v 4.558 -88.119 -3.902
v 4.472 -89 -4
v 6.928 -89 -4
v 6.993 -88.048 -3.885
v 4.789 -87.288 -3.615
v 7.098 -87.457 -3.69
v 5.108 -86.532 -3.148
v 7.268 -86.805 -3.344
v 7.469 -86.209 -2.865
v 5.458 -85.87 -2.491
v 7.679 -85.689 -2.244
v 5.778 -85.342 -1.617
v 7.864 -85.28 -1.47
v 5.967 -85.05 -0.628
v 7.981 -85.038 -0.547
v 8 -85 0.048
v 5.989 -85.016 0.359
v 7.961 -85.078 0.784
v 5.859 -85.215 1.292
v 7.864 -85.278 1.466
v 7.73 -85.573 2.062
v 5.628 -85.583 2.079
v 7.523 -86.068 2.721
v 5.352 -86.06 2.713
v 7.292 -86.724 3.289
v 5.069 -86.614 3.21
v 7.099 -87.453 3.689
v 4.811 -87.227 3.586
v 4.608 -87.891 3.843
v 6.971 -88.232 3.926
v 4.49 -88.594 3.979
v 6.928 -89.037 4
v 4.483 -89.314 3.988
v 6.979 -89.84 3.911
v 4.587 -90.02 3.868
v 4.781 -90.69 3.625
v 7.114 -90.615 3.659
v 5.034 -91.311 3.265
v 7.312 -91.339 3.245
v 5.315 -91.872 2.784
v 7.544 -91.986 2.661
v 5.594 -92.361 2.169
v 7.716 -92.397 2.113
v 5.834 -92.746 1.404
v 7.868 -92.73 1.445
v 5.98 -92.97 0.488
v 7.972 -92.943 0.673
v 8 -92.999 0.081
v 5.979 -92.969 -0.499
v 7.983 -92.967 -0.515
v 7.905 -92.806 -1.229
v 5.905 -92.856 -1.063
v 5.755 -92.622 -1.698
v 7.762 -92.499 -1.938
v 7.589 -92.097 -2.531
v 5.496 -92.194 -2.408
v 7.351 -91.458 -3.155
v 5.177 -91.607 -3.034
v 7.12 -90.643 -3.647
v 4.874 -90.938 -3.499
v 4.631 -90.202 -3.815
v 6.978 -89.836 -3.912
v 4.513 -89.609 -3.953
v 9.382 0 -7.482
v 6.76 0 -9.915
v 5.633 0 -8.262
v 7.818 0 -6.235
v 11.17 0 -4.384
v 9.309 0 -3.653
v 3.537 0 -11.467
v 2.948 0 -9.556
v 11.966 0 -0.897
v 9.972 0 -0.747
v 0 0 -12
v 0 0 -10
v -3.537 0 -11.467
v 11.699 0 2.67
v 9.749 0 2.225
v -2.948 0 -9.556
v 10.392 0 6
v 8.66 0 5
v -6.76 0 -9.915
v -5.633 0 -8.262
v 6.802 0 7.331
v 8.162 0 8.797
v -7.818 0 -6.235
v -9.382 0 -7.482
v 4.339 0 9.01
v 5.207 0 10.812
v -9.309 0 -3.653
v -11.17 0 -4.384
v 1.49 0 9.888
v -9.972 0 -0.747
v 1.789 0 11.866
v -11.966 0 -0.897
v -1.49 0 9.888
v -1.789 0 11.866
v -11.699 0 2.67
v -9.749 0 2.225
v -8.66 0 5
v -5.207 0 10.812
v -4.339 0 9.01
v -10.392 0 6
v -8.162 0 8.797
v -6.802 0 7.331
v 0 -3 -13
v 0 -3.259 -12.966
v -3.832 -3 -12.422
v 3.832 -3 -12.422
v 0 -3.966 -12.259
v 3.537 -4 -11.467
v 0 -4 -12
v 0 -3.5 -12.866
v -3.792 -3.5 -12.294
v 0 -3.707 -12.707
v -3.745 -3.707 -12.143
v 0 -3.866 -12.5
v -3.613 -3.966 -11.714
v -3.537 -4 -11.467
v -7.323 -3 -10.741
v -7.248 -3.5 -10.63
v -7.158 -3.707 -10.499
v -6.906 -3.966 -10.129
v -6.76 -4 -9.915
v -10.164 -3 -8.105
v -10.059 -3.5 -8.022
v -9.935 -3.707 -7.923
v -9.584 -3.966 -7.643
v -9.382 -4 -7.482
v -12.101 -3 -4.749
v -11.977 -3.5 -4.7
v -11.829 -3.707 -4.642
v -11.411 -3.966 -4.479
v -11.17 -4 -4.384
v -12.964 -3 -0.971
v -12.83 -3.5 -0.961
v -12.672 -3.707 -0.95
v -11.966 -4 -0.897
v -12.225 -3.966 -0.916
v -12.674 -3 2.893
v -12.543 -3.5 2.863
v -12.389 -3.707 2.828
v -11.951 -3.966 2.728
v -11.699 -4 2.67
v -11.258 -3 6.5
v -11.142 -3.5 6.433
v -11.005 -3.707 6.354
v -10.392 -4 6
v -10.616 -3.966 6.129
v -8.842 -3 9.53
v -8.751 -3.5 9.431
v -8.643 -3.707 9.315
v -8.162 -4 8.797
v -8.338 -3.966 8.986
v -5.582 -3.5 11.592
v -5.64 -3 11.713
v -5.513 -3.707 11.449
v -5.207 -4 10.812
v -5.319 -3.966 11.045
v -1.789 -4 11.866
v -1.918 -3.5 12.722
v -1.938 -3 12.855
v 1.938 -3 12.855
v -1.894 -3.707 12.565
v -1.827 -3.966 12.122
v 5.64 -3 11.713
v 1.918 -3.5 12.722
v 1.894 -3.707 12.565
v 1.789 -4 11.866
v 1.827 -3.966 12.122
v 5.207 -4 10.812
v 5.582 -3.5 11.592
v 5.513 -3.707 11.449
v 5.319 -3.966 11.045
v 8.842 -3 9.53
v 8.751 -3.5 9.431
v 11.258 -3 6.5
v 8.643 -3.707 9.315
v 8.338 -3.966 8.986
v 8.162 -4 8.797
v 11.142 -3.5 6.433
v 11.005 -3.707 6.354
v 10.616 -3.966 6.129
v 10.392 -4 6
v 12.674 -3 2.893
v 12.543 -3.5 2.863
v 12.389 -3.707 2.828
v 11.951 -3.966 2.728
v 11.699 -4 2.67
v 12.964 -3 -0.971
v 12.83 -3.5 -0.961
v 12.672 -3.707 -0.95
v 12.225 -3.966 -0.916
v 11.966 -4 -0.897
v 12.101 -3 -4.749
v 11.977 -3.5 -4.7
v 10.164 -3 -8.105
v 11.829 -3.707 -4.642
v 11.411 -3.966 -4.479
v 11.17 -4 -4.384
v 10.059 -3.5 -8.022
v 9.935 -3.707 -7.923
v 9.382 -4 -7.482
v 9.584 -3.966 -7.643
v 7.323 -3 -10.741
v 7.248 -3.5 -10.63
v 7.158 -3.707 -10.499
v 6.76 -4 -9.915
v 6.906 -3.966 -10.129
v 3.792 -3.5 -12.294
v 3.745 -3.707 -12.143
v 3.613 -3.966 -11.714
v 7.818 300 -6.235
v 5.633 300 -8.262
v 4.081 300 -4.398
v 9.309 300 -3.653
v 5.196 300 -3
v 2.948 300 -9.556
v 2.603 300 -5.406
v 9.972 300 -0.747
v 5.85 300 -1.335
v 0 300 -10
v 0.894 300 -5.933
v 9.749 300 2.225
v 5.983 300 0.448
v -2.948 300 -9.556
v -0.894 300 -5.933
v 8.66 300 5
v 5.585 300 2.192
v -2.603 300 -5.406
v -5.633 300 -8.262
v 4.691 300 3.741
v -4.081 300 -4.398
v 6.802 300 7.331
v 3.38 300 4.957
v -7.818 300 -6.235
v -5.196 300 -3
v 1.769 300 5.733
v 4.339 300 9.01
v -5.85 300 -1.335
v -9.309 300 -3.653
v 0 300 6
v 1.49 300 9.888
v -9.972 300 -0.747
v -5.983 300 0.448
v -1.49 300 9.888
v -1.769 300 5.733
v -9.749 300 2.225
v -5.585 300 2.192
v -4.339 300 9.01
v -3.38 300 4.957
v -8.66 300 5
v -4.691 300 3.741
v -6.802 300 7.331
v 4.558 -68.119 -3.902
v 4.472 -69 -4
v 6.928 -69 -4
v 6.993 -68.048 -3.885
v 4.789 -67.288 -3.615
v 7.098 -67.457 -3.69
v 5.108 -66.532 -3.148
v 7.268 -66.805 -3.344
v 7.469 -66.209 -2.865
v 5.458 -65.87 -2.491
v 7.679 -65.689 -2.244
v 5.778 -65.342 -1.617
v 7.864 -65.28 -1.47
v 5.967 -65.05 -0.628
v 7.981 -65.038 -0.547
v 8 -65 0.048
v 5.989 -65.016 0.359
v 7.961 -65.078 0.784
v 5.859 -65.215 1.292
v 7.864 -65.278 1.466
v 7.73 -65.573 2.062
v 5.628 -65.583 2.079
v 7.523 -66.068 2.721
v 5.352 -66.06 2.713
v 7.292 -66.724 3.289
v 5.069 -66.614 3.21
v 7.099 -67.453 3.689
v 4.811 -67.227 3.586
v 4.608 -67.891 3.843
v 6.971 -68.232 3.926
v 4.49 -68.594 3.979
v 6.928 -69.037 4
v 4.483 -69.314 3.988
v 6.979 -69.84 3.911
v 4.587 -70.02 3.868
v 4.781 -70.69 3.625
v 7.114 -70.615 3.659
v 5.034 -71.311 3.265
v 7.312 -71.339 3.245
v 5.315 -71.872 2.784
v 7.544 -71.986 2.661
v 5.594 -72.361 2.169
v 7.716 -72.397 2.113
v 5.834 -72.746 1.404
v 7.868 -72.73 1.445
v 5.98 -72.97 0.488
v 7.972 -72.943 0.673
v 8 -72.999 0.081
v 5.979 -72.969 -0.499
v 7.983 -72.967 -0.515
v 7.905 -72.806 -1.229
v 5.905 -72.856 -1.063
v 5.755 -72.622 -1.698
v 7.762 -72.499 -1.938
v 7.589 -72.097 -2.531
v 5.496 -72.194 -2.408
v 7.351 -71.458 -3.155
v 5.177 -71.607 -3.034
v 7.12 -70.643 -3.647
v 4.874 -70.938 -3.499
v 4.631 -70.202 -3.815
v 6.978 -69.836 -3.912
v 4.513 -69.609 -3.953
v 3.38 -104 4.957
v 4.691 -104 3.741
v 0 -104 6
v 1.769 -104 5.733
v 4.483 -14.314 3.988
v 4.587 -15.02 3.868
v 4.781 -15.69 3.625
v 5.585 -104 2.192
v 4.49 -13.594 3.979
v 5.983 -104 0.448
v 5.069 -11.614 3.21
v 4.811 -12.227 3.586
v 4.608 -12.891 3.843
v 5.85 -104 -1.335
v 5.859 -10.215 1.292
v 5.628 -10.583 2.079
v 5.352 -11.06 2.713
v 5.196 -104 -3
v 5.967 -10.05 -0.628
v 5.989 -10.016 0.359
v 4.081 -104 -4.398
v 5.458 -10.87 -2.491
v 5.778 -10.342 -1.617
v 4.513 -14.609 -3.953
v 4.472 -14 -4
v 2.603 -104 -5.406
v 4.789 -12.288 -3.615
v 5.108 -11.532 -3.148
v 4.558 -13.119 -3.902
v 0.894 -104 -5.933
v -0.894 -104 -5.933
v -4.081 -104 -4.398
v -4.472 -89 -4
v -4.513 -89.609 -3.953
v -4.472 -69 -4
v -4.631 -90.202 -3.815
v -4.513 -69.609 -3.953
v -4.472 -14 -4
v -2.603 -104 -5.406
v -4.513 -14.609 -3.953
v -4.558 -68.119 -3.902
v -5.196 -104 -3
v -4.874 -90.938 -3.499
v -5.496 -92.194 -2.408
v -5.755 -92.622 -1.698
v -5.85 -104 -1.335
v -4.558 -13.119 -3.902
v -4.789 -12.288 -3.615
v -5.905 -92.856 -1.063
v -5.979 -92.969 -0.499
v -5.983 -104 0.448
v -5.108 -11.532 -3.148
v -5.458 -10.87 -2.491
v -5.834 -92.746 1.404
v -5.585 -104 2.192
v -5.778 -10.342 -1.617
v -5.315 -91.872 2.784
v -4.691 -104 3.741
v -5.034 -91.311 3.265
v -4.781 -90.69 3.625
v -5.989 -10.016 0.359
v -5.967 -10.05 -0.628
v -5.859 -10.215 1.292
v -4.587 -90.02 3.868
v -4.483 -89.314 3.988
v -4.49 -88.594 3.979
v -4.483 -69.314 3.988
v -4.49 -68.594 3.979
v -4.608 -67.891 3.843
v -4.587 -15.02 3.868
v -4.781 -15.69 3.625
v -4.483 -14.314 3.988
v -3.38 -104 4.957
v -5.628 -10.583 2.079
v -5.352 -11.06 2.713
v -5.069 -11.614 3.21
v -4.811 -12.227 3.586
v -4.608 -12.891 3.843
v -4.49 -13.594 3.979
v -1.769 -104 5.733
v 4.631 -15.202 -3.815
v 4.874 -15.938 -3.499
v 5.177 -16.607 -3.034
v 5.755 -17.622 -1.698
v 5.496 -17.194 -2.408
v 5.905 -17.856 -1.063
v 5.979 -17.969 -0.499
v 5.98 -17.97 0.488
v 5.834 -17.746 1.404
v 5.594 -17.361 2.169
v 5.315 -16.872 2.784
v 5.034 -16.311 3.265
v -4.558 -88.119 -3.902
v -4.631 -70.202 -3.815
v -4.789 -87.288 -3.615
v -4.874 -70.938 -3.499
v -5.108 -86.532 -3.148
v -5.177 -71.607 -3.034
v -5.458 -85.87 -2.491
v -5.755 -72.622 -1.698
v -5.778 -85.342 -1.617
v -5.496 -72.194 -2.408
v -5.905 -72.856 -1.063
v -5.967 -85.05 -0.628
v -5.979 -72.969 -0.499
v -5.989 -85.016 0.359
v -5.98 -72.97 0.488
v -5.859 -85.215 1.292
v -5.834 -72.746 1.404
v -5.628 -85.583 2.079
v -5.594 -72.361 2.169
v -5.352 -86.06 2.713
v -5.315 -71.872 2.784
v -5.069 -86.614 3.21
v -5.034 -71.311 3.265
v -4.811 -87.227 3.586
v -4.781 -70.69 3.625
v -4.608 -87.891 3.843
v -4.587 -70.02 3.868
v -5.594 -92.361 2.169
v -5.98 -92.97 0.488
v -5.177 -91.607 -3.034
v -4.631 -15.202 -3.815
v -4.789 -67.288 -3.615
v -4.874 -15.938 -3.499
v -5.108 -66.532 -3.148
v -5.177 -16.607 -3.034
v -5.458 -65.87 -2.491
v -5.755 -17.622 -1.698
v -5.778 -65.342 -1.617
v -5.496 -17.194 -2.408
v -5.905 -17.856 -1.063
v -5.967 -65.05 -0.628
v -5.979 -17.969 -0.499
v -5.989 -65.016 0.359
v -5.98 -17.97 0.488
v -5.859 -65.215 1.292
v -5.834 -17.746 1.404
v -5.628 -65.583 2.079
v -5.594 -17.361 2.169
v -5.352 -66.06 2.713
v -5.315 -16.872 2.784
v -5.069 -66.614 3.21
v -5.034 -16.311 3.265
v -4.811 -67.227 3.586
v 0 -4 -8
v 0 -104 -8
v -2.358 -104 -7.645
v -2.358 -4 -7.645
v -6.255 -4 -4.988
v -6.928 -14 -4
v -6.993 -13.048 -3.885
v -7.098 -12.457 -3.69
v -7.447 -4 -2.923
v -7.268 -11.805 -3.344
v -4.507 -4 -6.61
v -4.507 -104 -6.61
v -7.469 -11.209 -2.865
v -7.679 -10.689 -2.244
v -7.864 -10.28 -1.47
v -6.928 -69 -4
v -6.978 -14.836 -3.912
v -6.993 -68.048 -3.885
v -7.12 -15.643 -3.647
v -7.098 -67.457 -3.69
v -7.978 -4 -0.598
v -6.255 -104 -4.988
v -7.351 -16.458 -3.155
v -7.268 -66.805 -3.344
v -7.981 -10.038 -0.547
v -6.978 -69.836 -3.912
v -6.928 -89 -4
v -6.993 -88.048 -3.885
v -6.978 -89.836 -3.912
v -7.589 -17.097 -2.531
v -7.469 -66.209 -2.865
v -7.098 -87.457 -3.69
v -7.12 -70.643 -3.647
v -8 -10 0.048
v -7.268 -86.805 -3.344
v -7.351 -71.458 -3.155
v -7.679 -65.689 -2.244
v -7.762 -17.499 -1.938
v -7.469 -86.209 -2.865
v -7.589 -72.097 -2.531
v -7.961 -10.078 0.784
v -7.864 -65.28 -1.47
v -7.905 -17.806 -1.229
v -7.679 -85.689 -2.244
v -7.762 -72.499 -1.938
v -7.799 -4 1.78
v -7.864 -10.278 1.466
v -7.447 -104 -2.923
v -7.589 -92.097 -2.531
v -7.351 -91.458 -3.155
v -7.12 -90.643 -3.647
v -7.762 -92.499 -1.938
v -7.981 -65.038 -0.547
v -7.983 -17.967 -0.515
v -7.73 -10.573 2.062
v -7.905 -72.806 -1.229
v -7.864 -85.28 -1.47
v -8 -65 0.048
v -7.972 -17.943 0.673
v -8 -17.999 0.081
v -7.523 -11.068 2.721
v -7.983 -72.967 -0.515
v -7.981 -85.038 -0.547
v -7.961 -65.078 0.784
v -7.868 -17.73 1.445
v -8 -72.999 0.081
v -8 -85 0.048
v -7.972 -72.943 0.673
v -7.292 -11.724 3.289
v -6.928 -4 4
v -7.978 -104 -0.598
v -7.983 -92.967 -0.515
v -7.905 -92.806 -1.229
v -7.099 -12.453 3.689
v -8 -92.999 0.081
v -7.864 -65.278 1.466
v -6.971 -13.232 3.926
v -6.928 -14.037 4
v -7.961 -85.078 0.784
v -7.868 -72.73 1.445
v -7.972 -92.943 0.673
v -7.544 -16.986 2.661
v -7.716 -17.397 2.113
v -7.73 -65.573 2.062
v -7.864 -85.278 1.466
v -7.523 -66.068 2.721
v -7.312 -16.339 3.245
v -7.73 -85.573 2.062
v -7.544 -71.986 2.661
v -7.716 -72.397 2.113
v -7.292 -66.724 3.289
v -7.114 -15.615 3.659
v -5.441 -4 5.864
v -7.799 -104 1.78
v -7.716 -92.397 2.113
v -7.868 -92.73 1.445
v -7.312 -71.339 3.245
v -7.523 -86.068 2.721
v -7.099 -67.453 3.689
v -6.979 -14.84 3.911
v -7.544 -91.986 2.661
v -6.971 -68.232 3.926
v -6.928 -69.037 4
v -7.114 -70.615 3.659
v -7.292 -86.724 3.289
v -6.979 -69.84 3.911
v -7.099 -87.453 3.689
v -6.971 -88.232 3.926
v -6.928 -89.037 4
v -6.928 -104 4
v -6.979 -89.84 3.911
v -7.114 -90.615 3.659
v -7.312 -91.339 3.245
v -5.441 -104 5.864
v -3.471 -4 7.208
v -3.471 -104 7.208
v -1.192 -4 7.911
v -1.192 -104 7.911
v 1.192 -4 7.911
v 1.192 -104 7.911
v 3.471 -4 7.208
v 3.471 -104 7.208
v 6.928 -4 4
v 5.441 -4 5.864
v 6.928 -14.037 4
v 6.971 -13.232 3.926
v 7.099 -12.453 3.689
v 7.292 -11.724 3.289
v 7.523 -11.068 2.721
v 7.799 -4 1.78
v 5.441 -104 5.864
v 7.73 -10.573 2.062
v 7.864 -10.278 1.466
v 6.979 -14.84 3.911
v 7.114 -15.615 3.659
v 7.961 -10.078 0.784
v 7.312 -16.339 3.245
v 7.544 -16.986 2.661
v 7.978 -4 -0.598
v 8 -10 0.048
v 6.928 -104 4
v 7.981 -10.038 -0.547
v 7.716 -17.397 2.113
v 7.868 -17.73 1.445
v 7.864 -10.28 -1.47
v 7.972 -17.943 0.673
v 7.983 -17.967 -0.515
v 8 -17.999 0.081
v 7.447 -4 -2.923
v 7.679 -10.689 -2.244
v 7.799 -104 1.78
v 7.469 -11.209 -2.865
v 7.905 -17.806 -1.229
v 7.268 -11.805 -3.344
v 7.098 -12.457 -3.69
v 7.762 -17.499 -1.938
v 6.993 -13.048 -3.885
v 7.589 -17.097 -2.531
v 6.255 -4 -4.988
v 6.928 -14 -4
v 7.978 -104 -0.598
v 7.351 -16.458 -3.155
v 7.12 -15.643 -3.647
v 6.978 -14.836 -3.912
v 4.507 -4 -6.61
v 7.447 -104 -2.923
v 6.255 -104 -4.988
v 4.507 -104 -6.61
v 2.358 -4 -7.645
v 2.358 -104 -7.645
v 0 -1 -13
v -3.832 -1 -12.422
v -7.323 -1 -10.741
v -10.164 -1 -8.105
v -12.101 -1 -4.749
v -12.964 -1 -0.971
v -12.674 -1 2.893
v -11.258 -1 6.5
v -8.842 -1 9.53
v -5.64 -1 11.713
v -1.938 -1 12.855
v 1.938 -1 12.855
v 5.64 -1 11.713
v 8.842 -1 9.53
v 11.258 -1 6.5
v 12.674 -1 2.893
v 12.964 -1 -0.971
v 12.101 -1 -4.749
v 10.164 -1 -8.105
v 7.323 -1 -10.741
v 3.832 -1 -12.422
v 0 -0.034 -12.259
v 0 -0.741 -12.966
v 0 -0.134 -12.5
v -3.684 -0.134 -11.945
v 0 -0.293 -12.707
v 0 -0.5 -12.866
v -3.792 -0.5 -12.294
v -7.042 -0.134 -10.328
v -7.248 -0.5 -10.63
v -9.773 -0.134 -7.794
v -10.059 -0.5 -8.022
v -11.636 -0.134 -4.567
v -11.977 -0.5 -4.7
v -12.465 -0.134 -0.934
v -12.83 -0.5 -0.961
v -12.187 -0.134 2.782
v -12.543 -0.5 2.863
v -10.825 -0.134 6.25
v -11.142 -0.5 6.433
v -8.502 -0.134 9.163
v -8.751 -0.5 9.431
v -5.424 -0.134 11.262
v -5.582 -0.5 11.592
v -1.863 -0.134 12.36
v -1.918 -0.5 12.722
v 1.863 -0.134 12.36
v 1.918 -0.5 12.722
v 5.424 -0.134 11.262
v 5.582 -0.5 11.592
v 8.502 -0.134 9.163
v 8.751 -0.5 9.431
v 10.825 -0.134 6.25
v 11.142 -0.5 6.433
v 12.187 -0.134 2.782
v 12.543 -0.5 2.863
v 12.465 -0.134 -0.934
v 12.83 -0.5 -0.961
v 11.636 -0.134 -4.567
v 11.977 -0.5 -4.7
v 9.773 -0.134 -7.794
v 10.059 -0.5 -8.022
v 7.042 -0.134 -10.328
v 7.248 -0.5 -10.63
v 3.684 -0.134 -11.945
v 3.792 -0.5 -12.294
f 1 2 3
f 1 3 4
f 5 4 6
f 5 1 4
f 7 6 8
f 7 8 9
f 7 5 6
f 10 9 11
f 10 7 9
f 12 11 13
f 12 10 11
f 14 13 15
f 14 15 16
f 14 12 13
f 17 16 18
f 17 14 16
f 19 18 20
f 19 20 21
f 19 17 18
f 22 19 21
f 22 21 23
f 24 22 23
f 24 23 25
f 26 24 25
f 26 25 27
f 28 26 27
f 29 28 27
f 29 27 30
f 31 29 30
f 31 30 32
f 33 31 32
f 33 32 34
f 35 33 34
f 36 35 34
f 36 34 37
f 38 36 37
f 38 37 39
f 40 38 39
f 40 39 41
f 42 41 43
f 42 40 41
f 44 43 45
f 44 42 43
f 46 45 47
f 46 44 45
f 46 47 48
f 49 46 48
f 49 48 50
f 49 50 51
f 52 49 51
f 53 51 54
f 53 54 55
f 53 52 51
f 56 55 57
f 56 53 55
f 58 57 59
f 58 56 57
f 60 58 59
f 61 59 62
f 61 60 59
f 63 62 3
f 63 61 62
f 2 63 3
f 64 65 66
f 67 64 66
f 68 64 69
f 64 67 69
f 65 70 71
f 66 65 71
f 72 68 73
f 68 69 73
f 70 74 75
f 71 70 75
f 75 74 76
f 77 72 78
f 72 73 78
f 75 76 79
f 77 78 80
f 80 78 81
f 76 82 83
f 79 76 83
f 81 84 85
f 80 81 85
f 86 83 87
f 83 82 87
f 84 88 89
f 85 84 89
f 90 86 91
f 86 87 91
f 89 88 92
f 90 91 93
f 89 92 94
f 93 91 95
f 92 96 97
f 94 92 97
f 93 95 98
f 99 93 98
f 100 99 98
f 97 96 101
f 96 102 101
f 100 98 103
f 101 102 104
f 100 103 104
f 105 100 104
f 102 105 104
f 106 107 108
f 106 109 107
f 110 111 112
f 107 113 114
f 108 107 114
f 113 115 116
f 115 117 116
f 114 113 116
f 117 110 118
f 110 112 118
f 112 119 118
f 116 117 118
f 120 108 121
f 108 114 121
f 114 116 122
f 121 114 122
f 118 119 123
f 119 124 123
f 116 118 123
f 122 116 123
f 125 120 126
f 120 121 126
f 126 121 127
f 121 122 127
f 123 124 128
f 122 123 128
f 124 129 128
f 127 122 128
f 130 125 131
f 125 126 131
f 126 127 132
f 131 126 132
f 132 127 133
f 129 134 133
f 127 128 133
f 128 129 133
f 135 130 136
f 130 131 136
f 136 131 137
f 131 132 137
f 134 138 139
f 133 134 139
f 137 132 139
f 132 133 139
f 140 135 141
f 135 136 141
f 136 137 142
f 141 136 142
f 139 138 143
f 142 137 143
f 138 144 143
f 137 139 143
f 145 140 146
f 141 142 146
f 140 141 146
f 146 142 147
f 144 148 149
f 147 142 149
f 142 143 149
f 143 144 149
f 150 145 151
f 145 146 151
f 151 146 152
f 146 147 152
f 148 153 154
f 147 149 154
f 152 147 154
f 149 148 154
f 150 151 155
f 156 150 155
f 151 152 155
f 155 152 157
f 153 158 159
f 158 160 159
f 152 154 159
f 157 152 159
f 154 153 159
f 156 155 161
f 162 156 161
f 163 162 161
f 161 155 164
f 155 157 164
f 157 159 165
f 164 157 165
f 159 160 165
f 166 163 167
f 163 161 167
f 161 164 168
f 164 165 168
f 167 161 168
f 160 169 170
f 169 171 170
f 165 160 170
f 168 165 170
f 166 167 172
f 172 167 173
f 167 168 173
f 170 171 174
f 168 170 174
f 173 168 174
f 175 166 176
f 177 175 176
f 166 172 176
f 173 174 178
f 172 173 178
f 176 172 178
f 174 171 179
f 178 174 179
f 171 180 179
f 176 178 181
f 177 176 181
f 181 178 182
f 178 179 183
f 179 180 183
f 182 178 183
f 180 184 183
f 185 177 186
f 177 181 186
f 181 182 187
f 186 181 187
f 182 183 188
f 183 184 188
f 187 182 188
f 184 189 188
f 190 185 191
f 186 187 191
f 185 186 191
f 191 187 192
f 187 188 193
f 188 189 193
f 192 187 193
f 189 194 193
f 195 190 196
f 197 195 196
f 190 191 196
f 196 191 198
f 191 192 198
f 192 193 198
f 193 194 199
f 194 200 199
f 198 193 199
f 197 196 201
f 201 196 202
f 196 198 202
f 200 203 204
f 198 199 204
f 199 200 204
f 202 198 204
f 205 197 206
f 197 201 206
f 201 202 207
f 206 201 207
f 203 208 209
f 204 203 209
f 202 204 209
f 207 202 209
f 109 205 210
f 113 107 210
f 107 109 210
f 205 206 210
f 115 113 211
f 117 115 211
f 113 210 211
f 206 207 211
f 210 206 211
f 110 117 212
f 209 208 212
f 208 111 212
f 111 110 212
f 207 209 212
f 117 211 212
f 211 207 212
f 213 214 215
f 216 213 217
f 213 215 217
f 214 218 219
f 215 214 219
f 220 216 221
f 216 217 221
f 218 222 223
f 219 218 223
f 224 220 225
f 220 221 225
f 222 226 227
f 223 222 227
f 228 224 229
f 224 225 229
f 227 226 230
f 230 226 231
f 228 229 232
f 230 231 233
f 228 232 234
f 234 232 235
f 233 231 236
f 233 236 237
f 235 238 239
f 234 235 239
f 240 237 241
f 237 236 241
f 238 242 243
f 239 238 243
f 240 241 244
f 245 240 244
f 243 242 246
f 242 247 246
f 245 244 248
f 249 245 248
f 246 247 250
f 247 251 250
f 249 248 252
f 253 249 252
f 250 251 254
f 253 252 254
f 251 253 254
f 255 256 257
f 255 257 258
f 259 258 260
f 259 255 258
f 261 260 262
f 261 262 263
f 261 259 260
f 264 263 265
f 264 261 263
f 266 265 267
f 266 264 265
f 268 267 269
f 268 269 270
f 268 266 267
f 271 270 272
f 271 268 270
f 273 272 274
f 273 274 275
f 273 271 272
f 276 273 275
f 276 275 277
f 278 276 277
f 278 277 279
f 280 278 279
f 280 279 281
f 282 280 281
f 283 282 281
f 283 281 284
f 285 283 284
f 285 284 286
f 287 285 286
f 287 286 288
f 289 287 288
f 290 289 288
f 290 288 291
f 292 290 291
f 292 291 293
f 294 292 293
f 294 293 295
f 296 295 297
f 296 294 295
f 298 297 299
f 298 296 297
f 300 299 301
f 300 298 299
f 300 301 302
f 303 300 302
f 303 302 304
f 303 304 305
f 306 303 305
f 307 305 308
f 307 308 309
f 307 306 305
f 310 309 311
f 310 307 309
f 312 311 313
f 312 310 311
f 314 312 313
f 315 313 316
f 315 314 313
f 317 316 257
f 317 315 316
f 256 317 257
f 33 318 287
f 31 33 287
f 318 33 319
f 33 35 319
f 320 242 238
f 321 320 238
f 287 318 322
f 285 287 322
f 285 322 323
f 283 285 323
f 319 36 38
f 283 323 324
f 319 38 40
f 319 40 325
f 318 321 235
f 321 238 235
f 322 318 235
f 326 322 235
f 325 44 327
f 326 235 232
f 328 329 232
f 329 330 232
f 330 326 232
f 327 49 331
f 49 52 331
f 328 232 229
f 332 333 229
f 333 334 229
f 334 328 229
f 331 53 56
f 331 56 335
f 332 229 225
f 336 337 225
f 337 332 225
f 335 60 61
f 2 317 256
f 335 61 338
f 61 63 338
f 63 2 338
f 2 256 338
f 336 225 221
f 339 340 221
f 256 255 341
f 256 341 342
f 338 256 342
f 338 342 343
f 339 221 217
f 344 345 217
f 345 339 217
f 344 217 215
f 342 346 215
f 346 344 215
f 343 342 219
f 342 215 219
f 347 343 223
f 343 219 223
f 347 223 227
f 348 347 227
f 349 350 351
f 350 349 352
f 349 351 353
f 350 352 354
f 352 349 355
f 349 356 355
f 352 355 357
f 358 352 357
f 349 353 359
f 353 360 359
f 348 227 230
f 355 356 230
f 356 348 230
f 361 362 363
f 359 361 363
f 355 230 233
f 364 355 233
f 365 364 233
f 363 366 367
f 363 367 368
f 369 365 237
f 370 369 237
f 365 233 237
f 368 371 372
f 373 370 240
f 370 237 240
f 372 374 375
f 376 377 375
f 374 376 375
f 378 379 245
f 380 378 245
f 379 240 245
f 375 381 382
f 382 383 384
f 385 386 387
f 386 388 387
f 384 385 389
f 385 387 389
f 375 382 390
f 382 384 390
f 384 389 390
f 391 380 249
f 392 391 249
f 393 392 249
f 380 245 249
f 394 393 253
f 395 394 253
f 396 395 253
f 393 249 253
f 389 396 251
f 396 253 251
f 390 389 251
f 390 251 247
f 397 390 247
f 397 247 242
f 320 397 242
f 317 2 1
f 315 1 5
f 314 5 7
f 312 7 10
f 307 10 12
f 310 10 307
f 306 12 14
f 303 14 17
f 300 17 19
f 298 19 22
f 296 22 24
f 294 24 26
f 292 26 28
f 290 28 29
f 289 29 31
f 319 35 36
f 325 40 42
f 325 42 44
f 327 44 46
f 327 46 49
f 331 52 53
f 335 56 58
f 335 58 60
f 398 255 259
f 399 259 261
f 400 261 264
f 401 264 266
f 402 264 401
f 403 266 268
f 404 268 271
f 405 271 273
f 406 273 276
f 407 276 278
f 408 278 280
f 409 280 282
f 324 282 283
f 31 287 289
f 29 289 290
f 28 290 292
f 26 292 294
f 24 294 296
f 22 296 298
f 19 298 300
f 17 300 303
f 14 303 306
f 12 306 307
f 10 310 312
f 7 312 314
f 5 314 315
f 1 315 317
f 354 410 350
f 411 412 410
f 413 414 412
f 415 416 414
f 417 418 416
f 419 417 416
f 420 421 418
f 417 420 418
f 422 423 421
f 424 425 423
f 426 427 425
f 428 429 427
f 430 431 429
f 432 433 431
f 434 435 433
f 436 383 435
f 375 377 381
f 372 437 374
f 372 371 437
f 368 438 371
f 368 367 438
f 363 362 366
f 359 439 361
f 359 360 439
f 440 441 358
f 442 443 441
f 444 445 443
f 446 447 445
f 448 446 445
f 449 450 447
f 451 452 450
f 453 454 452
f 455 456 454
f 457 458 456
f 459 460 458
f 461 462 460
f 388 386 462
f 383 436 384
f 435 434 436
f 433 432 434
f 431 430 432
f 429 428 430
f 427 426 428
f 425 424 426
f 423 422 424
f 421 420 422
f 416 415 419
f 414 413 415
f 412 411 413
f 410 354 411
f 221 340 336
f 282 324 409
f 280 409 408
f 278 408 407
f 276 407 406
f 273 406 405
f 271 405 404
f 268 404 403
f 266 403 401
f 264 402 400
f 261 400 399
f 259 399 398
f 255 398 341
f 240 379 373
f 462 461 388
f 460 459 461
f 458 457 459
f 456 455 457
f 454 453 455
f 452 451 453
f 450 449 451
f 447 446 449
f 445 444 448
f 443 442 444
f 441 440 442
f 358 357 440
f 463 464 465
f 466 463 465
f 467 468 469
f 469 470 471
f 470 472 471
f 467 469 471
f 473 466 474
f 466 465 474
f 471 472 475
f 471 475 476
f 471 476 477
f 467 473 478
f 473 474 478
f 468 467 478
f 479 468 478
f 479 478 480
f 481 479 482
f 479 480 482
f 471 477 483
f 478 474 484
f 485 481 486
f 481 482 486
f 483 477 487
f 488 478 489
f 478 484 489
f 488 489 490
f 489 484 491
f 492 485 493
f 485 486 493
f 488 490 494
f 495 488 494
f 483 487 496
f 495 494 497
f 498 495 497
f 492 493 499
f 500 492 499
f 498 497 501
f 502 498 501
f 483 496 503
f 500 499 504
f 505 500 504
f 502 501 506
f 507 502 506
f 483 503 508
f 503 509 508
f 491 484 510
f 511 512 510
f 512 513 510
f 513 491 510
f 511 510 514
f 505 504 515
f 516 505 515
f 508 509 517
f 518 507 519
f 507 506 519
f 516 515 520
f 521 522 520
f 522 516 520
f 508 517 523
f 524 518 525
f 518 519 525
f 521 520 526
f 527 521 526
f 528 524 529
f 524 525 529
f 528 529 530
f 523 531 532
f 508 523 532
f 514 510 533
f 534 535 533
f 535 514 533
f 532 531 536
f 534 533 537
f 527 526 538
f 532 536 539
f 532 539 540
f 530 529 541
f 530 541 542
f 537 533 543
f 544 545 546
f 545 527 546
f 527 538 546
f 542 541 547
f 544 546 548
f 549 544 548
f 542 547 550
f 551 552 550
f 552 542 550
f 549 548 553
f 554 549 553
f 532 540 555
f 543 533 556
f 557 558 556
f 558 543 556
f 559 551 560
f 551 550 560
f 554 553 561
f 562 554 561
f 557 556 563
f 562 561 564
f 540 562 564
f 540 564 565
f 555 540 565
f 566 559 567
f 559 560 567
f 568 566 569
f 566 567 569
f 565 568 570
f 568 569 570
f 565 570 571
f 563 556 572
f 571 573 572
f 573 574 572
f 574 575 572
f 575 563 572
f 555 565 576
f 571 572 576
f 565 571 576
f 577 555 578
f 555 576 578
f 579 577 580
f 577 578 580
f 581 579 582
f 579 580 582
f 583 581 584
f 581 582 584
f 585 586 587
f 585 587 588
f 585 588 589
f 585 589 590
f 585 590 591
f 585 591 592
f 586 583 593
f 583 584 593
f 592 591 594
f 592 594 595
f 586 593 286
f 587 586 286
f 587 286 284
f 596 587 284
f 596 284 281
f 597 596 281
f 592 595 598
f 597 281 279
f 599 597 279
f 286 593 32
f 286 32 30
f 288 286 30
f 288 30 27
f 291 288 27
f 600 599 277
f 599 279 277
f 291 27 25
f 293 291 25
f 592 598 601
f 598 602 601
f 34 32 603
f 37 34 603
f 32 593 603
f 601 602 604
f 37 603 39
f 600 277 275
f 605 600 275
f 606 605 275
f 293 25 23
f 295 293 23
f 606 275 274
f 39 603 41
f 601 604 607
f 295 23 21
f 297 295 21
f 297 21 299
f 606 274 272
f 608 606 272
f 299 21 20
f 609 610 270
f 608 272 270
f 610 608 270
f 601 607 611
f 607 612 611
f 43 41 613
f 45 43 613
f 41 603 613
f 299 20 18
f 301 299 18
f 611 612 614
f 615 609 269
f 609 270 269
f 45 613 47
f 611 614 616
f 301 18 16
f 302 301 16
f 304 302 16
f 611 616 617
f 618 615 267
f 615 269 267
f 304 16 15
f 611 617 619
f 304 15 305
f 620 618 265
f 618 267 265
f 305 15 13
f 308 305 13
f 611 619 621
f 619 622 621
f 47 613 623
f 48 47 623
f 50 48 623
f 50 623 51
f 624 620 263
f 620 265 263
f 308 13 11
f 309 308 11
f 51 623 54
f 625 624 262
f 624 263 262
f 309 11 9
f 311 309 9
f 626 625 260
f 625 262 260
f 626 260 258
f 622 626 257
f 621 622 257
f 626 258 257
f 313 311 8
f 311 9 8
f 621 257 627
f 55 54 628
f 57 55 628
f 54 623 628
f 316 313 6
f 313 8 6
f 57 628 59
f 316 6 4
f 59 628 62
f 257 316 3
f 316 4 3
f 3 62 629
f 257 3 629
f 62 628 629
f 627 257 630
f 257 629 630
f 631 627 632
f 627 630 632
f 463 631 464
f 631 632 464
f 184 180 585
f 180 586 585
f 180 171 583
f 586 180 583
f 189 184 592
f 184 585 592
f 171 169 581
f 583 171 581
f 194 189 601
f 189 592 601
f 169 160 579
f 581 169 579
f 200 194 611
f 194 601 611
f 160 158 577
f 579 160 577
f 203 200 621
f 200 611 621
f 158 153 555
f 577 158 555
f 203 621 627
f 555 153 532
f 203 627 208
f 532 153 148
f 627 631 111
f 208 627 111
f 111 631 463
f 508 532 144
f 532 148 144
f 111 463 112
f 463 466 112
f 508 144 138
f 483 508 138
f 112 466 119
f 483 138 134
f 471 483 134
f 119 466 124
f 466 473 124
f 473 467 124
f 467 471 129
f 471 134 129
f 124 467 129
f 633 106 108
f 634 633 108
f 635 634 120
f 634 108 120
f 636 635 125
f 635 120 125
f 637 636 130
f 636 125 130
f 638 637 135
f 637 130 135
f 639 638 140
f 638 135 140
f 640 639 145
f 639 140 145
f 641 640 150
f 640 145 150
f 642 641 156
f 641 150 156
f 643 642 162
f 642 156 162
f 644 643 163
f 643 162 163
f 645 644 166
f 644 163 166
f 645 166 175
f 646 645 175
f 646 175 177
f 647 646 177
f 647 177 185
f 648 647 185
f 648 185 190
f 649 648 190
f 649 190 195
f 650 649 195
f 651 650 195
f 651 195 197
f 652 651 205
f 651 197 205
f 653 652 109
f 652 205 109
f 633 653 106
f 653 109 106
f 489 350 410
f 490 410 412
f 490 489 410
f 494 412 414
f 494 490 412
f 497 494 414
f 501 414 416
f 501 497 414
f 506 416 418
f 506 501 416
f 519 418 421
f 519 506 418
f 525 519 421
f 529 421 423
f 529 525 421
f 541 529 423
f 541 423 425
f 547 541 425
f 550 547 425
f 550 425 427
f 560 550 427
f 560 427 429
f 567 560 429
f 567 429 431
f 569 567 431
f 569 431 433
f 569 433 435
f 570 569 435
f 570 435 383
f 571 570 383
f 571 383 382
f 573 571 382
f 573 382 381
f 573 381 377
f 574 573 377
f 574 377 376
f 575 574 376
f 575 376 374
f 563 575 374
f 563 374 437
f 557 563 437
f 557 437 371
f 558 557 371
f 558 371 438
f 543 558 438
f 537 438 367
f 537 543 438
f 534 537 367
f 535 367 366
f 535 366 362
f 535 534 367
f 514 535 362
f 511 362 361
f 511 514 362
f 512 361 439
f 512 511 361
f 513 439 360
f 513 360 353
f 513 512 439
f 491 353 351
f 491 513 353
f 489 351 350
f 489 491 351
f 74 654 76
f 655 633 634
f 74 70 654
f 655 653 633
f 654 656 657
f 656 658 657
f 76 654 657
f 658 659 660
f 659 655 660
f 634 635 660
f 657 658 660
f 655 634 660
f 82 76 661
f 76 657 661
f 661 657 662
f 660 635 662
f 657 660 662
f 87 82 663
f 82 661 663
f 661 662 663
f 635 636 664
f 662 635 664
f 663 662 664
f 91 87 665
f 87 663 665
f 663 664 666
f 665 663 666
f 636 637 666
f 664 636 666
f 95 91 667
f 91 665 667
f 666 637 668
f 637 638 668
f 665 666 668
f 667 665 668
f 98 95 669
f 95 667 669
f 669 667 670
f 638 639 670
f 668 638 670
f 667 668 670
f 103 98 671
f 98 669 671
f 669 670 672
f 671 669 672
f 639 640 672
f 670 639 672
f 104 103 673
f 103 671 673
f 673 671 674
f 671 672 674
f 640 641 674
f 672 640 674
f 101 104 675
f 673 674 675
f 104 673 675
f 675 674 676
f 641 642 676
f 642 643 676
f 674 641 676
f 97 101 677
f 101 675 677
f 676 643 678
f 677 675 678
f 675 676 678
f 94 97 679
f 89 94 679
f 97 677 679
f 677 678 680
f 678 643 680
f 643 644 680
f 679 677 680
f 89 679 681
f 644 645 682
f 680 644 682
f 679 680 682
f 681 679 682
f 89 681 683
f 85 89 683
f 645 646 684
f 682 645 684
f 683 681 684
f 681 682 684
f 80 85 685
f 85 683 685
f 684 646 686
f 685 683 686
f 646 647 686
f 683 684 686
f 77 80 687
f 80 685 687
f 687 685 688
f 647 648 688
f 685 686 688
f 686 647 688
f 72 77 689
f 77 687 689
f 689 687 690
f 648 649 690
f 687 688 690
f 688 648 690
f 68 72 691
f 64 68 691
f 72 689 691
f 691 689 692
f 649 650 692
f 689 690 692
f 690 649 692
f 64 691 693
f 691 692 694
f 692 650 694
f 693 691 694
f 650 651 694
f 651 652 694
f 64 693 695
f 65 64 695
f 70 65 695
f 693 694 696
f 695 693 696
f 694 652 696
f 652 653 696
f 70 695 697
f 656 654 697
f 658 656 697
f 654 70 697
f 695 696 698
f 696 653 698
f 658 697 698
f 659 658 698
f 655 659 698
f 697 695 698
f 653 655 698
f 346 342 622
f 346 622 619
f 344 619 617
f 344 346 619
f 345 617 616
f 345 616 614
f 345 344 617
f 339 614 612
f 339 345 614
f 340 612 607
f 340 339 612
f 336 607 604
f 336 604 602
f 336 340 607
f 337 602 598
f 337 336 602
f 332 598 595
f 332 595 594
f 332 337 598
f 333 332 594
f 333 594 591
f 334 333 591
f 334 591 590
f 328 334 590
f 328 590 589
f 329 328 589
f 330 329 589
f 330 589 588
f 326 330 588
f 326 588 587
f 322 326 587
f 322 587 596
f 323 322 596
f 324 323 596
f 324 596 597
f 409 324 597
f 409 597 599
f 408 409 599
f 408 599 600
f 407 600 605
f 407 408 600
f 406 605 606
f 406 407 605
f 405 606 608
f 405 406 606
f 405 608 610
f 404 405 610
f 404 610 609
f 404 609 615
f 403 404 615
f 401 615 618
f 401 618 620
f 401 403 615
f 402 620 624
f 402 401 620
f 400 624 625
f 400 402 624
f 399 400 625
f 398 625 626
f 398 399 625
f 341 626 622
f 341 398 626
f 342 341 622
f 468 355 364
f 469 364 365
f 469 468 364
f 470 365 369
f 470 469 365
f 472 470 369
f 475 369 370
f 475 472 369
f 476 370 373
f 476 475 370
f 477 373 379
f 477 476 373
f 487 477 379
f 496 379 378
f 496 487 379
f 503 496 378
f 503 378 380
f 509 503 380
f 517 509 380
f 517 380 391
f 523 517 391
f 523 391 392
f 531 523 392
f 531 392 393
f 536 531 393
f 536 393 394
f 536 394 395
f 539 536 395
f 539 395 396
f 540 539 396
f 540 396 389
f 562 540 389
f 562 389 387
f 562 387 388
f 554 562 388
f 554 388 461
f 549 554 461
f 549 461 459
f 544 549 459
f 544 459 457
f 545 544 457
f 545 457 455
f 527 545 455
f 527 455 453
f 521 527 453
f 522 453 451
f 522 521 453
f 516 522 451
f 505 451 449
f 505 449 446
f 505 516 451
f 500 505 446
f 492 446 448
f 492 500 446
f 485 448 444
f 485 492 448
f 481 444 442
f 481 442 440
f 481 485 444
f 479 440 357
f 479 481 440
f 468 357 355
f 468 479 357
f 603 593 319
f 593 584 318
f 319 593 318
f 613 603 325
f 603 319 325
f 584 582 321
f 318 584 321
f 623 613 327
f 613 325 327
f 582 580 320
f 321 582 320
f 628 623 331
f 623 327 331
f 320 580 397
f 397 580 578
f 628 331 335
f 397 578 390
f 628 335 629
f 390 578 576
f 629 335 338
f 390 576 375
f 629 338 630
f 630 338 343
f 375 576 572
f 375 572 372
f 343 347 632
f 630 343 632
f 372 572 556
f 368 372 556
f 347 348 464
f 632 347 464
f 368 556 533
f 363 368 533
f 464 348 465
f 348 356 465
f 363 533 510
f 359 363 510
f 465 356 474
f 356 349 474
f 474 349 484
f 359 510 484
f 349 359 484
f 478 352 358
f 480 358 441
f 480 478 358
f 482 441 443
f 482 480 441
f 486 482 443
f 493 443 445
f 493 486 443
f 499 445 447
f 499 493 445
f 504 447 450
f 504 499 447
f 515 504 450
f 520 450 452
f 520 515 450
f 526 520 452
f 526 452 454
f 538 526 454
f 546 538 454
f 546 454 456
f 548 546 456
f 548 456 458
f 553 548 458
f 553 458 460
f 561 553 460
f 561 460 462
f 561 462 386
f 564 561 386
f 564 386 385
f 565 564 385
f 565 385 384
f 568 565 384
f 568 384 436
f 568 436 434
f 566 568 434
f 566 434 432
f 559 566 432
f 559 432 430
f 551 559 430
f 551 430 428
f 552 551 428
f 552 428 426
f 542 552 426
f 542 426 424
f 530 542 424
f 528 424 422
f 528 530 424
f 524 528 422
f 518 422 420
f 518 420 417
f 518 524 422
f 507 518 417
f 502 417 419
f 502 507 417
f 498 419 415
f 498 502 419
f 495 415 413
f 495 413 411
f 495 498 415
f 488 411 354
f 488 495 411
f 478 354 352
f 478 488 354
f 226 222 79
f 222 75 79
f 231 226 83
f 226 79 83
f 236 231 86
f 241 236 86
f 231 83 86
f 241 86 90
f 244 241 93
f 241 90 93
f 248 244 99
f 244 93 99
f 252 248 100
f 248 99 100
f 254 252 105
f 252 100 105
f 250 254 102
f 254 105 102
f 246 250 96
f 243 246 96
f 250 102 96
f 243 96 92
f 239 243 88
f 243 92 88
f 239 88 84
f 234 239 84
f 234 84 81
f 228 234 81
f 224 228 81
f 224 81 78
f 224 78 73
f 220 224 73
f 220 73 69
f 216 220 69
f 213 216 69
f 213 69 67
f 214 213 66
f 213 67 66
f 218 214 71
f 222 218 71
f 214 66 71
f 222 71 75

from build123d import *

# Parameters (mm, degrees)
SKETCH2_R               = 6
CUT_EXTRUDE1_DEPTH      = 405.418100485
CUT_EXTRUDE3_DEPTH      = 301.562805417
CUT_EXTRUDE3_DEPTH_BACK = 301.562805417
SKETCH3_R               = 4
FILLET1_R               = 1


with BuildPart() as part:
    # Sketch1 → Revolve1 (revolve)
    with BuildSketch(Plane(origin=(0, 0, 0), x_dir=(0, 0, -1), z_dir=(1, 0, 0))):
        Polygon((0, 0), (0, 300), (10, 300), (10, 0), (13, 0), (13, -4), (8, -4), (8, -104), (0, -104), align=None)
    revolve(axis=Axis((0, 0, 0), (0, 1, 0)))

    # Sketch2 → Cut-Extrude1 (cut, through all)
    with BuildSketch(Plane(origin=(0, 300, 0), x_dir=(1, 0, 0), z_dir=(0, 1, 0))):
        with Locations(Location((0, 0, 0), (0, 0, 270))):
            Circle(SKETCH2_R)
    extrude(amount=-CUT_EXTRUDE1_DEPTH, mode=Mode.SUBTRACT)

    # Sketch3 → Cut-Extrude3 (cut, two sides: drawn at the far end of the back side and taken through both)
    with BuildSketch(Plane(origin=(0, 0, 0), x_dir=(0, 0, -1), z_dir=(1, 0, 0)).offset(-CUT_EXTRUDE3_DEPTH_BACK)):
        with Locations((0, -14)):
            Circle(SKETCH3_R)
        with Locations((0, -69)):
            Circle(SKETCH3_R)
        with Locations((0, -89)):
            Circle(SKETCH3_R)
    extrude(amount=CUT_EXTRUDE3_DEPTH + CUT_EXTRUDE3_DEPTH_BACK, mode=Mode.SUBTRACT)

    # Fillet1
    fillet1_edges = [part.edges().sort_by_distance(p)[0] for p in [
        (0, -4, 13),
        (0, 0, 13),
    ]]
    fillet(fillet1_edges, radius=FILLET1_R)


solid = part.part
